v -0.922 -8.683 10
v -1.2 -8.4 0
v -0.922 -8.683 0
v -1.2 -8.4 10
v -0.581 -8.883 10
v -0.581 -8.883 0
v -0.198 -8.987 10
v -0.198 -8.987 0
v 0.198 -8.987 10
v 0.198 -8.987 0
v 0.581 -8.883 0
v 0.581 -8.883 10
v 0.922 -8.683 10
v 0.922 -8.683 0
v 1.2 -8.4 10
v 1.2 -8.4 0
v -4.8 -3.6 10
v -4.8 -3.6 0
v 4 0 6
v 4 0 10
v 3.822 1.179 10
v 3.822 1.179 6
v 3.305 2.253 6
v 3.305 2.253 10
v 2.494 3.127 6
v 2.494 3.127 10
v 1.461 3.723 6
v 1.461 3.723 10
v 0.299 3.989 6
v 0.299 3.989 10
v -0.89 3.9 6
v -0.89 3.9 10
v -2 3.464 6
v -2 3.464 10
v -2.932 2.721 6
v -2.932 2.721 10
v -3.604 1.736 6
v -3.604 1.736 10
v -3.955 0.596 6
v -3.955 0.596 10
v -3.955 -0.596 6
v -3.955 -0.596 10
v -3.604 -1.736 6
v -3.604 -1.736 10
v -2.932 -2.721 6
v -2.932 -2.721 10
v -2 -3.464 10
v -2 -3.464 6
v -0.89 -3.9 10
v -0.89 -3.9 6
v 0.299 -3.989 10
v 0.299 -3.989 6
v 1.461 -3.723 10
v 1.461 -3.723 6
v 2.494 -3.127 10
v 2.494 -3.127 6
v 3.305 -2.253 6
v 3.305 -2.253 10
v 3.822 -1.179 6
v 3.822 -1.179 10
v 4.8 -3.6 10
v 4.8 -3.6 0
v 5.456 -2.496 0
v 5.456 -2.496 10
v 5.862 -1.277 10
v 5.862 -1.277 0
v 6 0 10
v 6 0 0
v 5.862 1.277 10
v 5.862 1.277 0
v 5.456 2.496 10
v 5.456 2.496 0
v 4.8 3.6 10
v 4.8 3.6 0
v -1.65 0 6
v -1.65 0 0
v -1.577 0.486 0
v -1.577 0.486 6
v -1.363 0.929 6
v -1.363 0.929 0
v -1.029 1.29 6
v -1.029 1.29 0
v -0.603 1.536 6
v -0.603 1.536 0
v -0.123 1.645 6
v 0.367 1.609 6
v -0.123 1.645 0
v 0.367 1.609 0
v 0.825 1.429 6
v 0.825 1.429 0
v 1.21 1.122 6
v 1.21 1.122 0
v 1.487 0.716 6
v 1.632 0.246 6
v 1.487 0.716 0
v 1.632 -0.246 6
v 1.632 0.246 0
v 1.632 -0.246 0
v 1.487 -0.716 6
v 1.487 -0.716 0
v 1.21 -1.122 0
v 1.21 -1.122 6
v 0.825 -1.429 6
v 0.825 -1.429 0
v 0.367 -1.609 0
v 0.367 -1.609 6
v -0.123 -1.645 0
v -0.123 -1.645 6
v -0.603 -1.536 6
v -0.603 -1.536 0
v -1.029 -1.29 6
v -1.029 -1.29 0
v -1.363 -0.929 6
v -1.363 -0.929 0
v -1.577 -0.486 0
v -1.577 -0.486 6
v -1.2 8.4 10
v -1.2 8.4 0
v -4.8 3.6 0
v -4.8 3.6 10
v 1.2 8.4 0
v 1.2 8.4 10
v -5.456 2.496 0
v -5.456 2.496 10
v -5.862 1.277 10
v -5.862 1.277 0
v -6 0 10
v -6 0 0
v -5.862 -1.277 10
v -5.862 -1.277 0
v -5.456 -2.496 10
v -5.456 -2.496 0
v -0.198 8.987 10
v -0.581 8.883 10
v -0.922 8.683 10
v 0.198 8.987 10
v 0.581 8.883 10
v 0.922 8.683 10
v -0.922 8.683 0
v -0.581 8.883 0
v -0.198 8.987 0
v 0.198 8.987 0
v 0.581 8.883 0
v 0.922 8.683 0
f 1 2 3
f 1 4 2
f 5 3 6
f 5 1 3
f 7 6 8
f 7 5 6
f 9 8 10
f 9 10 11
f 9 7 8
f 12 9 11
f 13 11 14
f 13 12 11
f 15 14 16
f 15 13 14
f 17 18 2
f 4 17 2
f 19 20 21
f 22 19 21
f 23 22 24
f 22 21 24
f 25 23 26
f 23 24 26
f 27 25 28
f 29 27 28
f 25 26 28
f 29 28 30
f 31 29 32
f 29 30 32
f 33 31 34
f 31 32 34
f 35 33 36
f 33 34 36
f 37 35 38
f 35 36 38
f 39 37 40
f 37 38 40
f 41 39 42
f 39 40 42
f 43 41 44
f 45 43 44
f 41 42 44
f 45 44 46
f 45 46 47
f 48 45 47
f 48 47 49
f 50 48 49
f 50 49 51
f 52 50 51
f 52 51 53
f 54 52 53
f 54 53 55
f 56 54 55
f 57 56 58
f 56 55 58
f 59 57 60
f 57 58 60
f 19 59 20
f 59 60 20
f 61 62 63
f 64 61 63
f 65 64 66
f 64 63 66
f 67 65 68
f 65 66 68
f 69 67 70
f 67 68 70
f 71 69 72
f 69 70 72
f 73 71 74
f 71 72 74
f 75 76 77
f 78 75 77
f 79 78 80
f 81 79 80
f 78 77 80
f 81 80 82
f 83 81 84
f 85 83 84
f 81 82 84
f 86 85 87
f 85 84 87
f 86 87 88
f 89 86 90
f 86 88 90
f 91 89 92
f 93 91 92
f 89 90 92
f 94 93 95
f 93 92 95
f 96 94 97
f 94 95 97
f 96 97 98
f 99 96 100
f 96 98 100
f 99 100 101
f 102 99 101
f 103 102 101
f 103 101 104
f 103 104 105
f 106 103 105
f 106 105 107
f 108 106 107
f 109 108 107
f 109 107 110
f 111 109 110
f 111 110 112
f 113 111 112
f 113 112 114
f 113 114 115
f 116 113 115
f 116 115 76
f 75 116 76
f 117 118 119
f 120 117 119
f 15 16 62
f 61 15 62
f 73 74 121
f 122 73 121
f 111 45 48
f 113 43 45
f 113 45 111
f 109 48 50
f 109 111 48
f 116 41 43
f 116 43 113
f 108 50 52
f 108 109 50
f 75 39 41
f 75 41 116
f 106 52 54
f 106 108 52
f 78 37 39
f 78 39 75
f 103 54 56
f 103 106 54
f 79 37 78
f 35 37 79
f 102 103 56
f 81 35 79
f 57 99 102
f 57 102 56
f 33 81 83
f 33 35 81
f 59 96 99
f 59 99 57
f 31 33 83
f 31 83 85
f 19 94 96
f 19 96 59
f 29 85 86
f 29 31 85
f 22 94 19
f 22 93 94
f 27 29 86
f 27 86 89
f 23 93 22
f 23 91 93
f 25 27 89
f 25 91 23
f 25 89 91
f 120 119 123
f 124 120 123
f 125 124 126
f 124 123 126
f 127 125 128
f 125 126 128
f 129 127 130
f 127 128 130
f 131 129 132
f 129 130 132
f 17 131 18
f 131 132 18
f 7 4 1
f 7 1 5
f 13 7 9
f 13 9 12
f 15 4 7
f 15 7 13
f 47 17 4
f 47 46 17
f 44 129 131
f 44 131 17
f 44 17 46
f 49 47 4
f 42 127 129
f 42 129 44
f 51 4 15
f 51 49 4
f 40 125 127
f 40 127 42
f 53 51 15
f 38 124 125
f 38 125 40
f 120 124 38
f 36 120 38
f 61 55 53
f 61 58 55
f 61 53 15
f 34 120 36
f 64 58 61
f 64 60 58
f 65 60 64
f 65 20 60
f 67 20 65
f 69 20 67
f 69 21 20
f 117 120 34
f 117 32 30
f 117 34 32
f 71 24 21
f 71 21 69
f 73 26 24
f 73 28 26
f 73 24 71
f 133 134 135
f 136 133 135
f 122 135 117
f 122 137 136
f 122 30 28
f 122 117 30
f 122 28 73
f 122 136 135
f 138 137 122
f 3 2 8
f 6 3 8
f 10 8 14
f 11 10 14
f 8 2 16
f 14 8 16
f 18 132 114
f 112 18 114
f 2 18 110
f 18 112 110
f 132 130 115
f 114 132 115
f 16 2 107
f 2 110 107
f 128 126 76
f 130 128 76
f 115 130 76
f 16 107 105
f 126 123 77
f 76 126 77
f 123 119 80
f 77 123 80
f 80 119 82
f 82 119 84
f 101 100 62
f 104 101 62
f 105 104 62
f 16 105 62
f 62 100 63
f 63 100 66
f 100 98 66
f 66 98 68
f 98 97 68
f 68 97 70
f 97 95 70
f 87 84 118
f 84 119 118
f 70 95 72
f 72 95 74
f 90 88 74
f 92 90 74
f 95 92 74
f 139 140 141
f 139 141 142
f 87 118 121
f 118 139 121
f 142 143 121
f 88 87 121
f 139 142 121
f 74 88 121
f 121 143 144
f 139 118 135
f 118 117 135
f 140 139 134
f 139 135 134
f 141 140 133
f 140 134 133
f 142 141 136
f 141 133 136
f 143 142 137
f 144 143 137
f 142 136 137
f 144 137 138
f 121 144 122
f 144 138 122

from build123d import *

# Parameters (mm, degrees)
EXTRUDE_1_DEPTH     = 10
SKETCH_2_R          = 4
CUT_EXTRUDE_1_DEPTH = 4
M4X0_71_D           = 3.3
FILLET_1_R          = 1.5


with BuildPart() as part:
    # Эскиз1 → Бобышка-Вытянуть1 (new body)
    with BuildSketch(Plane.XY):
        with BuildLine():
            Line((0, 10), (-4.8, 3.6))
            ThreePointArc((-4.8, 3.6), (-6, 0), (-4.8, -3.6))
            Line((-4.8, -3.6), (0, -10))
            Line((0, -10), (4.8, -3.6))
            ThreePointArc((4.8, -3.6), (6, 0), (4.8, 3.6))
            Line((4.8, 3.6), (0, 10))
        make_face()
    extrude(amount=EXTRUDE_1_DEPTH)

    # Эскиз2 → Вырез-Вытянуть1 (cut)
    with BuildSketch(Plane.XY.offset(10)):
        Circle(SKETCH_2_R)
    extrude(amount=-CUT_EXTRUDE_1_DEPTH, mode=Mode.SUBTRACT)

    # Отверстие обработанное метчиком M4x0.71 (through all)
    with Locations(Plane.XY.offset(6)):
        with Locations((0, 0)):
            Hole(M4X0_71_D / 2)

    # Скругление1
    fillet_1_edges = [part.edges().sort_by_distance(p)[0] for p in [
        (0, -10, 5),
        (0, 10, 5),
    ]]
    fillet(fillet_1_edges, radius=FILLET_1_R)


solid = part.part
